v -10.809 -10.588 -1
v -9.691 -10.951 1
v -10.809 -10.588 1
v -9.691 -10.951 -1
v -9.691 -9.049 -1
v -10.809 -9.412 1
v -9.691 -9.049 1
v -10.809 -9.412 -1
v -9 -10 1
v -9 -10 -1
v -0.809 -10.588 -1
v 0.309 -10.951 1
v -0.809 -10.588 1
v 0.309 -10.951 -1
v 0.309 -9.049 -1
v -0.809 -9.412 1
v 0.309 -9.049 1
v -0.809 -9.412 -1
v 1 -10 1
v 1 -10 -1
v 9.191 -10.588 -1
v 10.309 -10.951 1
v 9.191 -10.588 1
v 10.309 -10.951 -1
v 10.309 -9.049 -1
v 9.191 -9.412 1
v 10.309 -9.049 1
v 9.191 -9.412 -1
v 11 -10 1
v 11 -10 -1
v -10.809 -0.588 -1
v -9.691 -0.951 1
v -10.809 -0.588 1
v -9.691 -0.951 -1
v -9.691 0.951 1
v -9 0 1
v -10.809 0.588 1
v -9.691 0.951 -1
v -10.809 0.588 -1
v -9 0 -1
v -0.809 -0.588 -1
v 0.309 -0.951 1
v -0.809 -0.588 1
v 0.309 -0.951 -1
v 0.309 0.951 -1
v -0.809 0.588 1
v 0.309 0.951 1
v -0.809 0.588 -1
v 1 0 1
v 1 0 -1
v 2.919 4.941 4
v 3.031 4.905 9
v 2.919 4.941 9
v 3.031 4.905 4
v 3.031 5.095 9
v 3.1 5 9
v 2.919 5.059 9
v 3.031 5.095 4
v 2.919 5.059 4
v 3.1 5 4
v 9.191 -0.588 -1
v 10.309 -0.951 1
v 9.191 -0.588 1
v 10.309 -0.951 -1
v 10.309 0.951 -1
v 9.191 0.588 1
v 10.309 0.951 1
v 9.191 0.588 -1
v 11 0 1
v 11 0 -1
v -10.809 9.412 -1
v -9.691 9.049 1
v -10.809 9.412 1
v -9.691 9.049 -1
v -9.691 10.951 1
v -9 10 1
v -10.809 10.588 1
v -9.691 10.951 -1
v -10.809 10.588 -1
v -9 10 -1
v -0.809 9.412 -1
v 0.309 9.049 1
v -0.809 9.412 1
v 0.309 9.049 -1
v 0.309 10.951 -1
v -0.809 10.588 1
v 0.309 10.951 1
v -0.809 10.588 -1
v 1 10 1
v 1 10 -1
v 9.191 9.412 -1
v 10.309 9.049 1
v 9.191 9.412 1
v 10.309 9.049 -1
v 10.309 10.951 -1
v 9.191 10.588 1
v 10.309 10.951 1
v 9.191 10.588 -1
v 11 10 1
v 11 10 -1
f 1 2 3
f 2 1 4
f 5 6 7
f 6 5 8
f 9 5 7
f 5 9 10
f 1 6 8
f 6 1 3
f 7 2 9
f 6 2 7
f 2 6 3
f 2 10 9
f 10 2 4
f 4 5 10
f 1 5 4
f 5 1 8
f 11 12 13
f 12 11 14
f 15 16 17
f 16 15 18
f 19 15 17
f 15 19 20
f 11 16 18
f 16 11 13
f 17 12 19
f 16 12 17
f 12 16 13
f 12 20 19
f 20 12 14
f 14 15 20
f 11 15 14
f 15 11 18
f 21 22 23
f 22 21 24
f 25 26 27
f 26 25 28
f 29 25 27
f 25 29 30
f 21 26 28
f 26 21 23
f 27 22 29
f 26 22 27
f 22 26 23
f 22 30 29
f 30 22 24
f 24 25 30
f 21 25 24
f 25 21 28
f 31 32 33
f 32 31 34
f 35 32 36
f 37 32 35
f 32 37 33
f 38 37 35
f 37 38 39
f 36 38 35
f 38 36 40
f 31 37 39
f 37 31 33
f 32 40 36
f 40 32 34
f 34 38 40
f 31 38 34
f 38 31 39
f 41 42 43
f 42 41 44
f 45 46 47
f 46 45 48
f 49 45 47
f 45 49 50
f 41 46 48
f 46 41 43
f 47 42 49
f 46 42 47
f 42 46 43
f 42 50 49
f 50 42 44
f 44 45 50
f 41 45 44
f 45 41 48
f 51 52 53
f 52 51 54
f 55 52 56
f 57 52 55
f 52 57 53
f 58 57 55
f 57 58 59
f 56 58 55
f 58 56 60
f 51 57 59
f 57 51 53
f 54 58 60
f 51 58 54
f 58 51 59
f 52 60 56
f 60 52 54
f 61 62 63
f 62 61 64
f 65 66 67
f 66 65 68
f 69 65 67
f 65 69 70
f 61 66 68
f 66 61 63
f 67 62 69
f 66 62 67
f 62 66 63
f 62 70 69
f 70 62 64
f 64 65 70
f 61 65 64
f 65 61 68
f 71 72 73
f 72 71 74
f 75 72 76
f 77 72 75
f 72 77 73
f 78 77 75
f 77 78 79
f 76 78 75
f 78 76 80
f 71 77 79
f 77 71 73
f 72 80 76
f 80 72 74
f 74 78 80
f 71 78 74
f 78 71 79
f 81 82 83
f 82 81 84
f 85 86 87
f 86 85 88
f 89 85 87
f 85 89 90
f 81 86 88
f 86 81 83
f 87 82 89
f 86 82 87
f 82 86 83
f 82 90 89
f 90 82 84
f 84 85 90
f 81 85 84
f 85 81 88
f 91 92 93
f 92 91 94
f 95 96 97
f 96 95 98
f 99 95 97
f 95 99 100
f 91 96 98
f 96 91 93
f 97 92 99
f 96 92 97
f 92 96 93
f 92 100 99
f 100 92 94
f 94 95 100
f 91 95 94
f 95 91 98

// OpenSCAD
// Hypothetical geometric selection and operation example
//  Required enhanced operators:
//	offset_3d();
//   explode();

module radial_pairs_filter(dr=1.0) {
  if($children>1) for(i=[0:$children-2]) for(j=[i:$children-1]) {
	echo(str(" radial_pairs_filter: child ",i," vs child ",j));
	union() filter() {
		children(i);
		children(j);
		intersection() {
			offset_3d(delta=dr) children(i);
			children(j);
		} // if no intersection, expect no 3rd child passed to filter()
	}
  } else {
	echo("Only one child detected.");
  }
}

module explode() {
	// place-holder
	children();
}

module filter() {
  if($children>2) {
	union() {
	  children(0);
	  children(1);
	}
	%hull() {children(0);children(2);}
  } else {
	echo("  Empty intersection; don't pair; return nothing.");
  }
}

module offset_3d(delta=1.0) {
	// positive offset equivalent
	minkowski() {
		children();
		sphere(r=delta,$fn=8);
	}
}

module shapes() {
	translate([-10,-10,0]) cylinder(r=1,h=2,center=true);
	translate([0,-10,0]) cylinder(r=1,h=2,center=true);
	translate([10,-10,0]) cylinder(r=1,h=2,center=true);
	translate([-10,0,0]) cylinder(r=1,h=2,center=true);
	translate([0,0,0]) cylinder(r=1,h=2,center=true);
	translate([3,5,4]) cylinder(r=0.1,h=5,center=false);
	translate([10,0,0]) cylinder(r=1,h=2,center=true);
	translate([-10,10,0]) cylinder(r=1,h=2,center=true);
	translate([0,10,0]) cylinder(r=1,h=2,center=true);
	translate([10,10,0]) cylinder(r=1,h=2,center=true);
}

module hull_pairs() {
  for(k=[0:$children-1])
	hull() children(k);
}

//hull_pairs() radial_pairs_filter(dr=8+16*$t) explode() shapes();
//%shapes();

radial_pairs_filter(dr=8+16*$t) {
	translate([-10,-10,0]) cylinder(r=1,h=2,center=true);
	translate([0,-10,0]) cylinder(r=1,h=2,center=true);
	translate([10,-10,0]) cylinder(r=1,h=2,center=true);
	translate([-10,0,0]) cylinder(r=1,h=2,center=true);
	translate([0,0,0]) cylinder(r=1,h=2,center=true);
	translate([3,5,4]) cylinder(r=0.1,h=5,center=false);
	translate([10,0,0]) cylinder(r=1,h=2,center=true);
	translate([-10,10,0]) cylinder(r=1,h=2,center=true);
	translate([0,10,0]) cylinder(r=1,h=2,center=true);
	translate([10,10,0]) cylinder(r=1,h=2,center=true);
}
